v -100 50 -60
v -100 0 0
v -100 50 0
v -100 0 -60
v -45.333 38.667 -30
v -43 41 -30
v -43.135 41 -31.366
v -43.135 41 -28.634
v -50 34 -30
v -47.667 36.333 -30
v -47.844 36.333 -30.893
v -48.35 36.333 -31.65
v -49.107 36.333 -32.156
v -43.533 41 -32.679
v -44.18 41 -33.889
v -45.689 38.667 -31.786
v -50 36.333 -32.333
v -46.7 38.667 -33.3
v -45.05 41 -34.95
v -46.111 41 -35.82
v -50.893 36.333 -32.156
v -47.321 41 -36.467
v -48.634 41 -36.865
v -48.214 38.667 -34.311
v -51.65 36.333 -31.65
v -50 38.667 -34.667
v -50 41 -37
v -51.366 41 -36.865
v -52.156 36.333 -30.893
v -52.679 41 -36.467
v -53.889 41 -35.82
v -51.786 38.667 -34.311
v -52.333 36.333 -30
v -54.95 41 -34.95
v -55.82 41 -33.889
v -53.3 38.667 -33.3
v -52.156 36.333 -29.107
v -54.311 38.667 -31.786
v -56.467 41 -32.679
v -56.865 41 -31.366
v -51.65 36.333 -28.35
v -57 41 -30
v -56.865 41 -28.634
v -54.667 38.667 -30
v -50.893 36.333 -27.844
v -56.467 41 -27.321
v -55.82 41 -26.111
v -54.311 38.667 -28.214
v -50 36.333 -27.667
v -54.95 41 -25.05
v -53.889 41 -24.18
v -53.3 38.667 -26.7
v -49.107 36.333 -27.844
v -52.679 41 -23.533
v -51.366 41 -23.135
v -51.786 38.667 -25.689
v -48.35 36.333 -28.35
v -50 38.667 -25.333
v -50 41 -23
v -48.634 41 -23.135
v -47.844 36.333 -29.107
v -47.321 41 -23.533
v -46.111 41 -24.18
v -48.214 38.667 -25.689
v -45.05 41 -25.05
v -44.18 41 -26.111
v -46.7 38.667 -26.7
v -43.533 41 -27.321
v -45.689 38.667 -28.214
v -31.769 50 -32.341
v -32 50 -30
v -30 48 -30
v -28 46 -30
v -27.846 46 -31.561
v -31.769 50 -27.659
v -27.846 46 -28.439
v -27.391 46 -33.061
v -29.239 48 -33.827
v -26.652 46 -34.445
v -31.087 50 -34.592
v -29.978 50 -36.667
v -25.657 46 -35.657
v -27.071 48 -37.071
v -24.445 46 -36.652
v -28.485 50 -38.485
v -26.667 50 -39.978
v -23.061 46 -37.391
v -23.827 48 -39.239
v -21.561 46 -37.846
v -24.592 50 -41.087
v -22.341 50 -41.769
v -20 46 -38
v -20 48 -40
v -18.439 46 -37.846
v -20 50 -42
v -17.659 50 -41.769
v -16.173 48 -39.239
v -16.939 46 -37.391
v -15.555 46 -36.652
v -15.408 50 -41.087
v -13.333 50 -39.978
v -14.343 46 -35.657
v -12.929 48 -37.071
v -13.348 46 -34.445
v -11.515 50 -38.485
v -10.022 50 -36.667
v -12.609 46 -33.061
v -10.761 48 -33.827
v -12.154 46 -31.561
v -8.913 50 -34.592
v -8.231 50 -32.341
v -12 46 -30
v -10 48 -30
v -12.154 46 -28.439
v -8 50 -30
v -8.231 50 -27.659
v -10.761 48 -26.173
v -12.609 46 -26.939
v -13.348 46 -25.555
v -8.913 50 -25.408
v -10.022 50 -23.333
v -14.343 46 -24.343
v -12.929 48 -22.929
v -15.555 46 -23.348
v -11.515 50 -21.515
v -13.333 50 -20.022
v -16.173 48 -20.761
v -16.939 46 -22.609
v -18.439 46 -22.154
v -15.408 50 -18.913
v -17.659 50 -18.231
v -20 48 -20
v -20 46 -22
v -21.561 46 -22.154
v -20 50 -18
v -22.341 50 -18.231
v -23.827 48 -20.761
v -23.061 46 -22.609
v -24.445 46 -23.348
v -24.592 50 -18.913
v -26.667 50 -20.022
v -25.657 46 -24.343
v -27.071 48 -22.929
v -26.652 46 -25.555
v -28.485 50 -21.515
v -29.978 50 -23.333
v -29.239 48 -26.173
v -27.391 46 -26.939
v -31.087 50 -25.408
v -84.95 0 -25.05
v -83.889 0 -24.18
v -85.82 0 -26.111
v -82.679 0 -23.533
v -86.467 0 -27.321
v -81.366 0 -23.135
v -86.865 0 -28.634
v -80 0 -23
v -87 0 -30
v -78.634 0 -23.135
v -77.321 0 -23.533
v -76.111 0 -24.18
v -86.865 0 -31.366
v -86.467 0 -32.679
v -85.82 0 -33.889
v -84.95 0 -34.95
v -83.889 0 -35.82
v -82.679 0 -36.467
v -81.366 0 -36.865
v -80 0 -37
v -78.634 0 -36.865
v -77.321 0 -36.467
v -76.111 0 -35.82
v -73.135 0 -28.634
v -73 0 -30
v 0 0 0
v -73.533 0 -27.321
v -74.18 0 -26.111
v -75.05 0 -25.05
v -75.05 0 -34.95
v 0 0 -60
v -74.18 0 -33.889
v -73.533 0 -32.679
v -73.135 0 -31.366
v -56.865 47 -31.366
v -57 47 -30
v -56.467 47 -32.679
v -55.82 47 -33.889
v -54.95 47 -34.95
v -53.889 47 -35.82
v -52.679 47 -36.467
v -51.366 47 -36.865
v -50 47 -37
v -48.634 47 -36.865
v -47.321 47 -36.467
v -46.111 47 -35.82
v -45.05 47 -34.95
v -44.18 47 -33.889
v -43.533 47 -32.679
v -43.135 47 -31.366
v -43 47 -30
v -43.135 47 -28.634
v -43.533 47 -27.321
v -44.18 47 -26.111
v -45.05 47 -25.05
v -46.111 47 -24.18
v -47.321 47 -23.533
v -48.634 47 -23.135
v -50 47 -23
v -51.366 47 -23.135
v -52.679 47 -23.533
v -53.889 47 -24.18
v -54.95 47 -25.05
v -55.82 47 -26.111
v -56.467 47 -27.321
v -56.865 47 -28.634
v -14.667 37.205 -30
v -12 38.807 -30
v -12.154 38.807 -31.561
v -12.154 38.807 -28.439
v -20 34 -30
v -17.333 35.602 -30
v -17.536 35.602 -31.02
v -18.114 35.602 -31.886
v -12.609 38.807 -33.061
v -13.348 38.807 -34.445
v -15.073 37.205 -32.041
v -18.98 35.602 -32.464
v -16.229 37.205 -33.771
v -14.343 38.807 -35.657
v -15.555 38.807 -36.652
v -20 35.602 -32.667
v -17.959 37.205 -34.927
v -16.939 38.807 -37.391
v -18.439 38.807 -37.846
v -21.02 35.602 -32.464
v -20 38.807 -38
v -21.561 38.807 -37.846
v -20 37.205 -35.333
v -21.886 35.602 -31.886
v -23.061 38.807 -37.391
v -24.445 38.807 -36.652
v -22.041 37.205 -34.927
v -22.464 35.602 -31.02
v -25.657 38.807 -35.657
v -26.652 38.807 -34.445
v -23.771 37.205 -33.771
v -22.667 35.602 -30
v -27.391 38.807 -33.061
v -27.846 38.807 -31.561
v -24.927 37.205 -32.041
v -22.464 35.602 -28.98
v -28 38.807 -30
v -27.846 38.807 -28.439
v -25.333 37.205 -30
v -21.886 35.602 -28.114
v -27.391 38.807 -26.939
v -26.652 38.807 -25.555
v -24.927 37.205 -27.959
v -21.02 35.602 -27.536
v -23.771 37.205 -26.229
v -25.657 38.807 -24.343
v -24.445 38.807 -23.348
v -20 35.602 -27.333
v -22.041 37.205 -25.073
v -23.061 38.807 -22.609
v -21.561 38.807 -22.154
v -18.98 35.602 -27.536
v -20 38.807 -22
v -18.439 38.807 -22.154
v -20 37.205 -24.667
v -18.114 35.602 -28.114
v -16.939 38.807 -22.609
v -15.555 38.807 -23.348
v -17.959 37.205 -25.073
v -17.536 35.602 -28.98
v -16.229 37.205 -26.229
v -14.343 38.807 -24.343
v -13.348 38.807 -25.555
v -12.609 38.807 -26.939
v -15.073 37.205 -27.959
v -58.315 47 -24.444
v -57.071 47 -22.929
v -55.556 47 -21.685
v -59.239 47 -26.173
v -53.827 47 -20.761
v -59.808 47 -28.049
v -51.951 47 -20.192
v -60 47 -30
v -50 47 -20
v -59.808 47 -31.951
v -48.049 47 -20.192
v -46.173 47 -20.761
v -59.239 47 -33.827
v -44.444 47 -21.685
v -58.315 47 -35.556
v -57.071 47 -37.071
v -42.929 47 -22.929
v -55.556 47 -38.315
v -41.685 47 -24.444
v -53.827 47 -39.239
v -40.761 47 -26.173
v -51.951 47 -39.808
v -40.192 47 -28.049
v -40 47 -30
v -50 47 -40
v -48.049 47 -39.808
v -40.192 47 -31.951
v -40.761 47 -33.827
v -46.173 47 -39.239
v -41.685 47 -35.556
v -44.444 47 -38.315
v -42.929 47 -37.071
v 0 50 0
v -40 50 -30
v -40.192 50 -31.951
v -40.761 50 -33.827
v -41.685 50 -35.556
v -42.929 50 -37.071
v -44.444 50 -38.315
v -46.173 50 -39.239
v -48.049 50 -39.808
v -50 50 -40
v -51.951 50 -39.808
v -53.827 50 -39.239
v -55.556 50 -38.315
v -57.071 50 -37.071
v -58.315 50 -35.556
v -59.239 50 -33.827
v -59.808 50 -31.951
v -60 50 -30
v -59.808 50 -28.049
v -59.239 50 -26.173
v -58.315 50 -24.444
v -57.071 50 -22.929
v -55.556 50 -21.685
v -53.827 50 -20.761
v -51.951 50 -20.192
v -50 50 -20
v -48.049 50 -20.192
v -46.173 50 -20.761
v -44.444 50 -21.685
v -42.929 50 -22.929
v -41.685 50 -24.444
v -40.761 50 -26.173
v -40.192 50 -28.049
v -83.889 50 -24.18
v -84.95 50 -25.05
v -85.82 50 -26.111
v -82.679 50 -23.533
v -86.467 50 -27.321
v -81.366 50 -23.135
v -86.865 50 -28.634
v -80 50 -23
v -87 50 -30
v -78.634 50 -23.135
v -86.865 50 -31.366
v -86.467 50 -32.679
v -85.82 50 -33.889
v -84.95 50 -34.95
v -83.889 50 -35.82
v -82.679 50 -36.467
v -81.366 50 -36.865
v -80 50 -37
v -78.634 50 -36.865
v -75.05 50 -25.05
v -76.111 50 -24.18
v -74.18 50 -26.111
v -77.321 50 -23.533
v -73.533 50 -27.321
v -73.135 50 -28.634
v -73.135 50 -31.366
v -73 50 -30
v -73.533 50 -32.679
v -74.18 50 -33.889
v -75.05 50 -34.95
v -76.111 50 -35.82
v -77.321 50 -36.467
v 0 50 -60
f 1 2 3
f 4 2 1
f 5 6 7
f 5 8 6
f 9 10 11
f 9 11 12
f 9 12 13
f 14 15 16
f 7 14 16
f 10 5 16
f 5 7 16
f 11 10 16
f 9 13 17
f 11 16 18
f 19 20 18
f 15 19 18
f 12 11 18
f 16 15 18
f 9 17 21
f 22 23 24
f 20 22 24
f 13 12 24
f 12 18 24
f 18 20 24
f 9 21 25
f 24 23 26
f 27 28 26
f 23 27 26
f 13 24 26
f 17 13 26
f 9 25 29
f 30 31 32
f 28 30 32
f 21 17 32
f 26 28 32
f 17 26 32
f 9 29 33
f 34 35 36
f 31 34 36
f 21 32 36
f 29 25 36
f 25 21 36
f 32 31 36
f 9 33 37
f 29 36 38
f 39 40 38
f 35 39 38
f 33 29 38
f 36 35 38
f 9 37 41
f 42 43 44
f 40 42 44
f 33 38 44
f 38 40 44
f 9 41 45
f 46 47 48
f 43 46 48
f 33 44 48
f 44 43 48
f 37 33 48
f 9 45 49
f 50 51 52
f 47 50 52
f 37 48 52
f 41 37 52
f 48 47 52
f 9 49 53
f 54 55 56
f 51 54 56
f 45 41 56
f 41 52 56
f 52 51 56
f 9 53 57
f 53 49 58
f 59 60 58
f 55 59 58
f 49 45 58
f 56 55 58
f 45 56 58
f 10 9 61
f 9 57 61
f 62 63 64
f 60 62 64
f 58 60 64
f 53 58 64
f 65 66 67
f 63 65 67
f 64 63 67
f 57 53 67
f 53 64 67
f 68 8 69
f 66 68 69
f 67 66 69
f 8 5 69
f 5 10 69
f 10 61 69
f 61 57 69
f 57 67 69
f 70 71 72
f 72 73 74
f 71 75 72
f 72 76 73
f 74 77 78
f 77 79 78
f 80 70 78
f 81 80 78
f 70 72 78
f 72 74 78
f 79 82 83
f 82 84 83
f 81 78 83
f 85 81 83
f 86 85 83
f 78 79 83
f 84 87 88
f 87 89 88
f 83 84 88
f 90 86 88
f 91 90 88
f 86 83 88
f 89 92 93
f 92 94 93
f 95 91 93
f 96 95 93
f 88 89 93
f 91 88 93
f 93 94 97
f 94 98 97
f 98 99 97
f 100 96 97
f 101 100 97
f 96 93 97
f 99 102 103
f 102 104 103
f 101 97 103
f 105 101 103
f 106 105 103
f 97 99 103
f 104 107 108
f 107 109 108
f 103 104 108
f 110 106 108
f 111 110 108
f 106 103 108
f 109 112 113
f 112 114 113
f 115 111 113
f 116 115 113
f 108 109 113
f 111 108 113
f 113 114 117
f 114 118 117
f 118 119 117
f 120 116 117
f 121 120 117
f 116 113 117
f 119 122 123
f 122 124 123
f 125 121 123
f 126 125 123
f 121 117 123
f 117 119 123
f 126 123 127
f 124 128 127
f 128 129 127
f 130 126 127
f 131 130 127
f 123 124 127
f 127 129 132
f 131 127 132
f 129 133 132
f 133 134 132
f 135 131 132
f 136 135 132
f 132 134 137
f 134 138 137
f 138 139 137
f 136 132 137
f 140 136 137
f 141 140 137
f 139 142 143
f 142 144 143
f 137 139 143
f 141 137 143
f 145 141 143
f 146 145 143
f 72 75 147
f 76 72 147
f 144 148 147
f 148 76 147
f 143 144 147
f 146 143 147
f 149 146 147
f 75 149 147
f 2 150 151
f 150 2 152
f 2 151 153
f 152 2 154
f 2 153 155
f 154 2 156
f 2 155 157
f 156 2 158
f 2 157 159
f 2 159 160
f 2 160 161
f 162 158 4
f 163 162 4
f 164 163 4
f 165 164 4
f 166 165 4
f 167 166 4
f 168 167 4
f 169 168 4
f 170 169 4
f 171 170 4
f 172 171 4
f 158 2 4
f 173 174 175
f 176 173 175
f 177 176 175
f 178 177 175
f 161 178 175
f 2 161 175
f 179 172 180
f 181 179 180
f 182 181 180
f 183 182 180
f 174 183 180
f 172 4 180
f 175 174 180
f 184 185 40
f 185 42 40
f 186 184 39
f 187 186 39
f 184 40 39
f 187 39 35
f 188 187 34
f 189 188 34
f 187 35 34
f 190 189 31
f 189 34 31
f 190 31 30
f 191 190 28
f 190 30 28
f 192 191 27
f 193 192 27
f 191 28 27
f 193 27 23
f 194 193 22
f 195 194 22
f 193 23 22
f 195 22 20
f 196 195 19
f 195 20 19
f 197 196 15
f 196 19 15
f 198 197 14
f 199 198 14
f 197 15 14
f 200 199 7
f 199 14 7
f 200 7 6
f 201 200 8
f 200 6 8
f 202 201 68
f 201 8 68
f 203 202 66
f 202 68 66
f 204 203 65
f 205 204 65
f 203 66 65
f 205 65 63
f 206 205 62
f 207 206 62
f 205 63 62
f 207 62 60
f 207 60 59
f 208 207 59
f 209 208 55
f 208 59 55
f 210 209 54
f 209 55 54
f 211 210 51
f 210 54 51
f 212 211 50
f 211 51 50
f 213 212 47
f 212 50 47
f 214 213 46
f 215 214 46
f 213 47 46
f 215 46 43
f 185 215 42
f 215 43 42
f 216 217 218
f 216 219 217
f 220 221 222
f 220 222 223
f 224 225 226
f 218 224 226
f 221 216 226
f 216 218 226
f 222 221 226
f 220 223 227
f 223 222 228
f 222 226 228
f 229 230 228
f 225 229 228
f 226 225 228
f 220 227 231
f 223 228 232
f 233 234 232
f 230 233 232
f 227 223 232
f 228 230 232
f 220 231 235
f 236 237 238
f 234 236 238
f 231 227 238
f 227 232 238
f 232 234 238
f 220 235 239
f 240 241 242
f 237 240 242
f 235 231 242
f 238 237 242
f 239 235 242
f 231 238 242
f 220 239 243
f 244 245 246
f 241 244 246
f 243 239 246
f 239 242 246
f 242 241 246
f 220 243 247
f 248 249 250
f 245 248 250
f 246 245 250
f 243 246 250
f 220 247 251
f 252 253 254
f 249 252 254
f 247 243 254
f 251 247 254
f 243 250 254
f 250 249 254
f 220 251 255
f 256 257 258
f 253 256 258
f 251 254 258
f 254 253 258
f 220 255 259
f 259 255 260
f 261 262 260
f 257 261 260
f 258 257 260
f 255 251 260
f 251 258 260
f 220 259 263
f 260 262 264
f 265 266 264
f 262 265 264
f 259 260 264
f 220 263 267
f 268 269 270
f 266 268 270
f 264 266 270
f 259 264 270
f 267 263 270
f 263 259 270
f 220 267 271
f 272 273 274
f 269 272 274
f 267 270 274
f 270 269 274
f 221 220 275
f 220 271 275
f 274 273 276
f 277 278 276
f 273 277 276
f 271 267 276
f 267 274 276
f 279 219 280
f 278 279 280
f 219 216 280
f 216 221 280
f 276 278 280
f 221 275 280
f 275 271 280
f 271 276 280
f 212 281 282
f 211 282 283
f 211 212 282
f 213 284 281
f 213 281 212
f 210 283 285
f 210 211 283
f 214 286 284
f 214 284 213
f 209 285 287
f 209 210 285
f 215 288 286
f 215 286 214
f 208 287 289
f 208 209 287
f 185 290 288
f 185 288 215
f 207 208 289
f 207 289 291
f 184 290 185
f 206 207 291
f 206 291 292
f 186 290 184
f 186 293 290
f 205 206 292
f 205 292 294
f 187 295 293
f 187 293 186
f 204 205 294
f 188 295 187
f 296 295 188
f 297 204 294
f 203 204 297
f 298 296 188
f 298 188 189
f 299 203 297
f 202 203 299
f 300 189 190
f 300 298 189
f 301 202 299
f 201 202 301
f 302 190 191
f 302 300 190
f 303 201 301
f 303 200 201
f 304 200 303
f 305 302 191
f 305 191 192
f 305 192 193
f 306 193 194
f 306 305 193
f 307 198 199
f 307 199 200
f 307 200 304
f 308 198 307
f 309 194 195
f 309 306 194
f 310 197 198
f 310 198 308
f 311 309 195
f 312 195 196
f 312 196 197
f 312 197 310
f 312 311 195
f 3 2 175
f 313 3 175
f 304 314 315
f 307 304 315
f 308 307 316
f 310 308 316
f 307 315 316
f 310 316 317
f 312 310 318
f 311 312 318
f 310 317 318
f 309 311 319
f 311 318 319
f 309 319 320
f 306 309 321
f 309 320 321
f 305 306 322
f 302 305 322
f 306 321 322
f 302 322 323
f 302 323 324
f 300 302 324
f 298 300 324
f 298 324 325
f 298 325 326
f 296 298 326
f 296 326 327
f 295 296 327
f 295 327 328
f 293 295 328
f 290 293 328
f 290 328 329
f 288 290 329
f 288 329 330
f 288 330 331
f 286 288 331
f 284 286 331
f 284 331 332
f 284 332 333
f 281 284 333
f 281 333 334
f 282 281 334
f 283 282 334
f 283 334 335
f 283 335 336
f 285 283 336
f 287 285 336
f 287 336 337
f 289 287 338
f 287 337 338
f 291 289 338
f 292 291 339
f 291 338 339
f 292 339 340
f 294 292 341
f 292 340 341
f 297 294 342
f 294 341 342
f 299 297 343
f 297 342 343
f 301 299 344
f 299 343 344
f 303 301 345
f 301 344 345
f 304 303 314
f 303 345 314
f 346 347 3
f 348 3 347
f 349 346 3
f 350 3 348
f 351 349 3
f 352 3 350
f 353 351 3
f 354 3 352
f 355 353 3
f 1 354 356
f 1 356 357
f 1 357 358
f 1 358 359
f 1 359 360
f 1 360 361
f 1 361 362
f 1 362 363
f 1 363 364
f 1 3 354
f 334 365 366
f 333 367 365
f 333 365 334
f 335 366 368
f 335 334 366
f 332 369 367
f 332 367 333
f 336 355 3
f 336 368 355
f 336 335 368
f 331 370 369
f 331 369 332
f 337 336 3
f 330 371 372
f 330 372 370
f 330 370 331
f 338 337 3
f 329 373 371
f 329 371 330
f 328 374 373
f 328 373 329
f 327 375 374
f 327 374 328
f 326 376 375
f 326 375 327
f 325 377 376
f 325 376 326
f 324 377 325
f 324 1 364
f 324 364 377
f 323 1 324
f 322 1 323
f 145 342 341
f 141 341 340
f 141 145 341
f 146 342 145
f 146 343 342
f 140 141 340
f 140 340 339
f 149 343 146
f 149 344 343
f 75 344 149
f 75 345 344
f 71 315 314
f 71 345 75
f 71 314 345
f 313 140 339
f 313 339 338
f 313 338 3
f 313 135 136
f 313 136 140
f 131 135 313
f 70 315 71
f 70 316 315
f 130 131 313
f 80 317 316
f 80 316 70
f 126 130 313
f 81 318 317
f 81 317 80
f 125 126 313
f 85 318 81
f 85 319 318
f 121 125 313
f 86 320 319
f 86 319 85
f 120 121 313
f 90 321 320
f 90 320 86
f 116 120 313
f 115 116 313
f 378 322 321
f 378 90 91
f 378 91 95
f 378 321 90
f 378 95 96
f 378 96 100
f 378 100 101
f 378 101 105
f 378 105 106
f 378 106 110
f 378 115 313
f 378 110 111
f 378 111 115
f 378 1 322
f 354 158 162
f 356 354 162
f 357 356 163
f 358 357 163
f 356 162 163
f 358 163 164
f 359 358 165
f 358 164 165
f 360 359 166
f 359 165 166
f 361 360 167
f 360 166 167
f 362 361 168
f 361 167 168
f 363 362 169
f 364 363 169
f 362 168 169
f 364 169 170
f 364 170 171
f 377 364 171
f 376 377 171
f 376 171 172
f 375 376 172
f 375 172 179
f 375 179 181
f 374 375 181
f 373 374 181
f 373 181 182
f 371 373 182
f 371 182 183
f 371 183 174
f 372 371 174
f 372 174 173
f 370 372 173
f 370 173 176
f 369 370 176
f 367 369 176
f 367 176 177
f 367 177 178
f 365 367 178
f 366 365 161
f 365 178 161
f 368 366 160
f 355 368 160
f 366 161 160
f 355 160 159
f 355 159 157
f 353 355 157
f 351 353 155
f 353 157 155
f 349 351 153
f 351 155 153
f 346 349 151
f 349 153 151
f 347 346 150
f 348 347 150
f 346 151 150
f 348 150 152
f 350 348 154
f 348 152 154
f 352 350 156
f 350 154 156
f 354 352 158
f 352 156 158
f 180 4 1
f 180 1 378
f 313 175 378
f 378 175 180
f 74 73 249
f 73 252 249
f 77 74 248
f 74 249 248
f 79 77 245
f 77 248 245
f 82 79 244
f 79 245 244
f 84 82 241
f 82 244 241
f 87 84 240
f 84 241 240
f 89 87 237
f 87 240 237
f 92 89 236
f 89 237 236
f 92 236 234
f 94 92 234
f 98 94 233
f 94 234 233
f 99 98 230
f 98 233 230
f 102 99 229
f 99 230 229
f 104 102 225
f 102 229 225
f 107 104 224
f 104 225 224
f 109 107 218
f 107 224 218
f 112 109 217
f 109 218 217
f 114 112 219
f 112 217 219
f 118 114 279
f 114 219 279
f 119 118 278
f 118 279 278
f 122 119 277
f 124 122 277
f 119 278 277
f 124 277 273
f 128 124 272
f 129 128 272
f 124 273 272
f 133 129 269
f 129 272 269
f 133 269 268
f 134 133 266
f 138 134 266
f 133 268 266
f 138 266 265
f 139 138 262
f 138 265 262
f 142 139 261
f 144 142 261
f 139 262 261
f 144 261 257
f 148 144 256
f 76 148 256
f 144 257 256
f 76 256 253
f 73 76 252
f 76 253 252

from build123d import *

# Parameters (mm, degrees)
ESBO_O2_W                                 = 100
ESBO_O2_H                                 = 60
RESSALTO_EXTRUS_O1_DEPTH                  = 50
FURO1_D                                   = 14
FURO1_DEPTH                               = 9
FURO1_CBORE_D                             = 20
FURO1_CBORE_DEPTH                         = 3
FURO1_TIP                                 = 7
FURO2_D                                   = 16
FURO2_DEPTH                               = 11.193115048
FURO2_CSINK_D                             = 24
FURO2_CSINK_ANGLE                         = 90
FURO2_TIP                                 = 4.806884952
BROCA_DE_ROSQUEAR_PARA_TARRAXA_DE_M16X2_D = 14


with BuildPart() as part:
    # Esboço2 → Ressalto-extrusão1 (new body)
    with BuildSketch(Plane(origin=(0, 0, 0), x_dir=(1, 0, 0), z_dir=(0, 1, 0))):
        with Locations((-50, 30)):
            Rectangle(ESBO_O2_W, ESBO_O2_H)
    extrude(amount=RESSALTO_EXTRUS_O1_DEPTH)

    # Furo1
    with Locations(Plane(origin=(0, 50, 0), x_dir=(1, 0, 0), z_dir=(0, 1, 0))):
        with Locations((-50, 30)):
            CounterBoreHole(FURO1_D / 2, FURO1_CBORE_D / 2, FURO1_CBORE_DEPTH, depth=FURO1_DEPTH)
            with Locations((0, 0, -(FURO1_DEPTH + FURO1_TIP / 2))):  # 90° drill point
                Cone(0, FURO1_D / 2, FURO1_TIP, mode=Mode.SUBTRACT)

    # Furo2
    with Locations(Plane(origin=(0, 50, 0), x_dir=(1, 0, 0), z_dir=(0, 1, 0))):
        with Locations((-20, 30)):
            CounterSinkHole(FURO2_D / 2, FURO2_CSINK_D / 2, depth=FURO2_DEPTH, counter_sink_angle=FURO2_CSINK_ANGLE)
            with Locations((0, 0, -(FURO2_DEPTH + FURO2_TIP / 2))):  # 118° drill point
                Cone(0, FURO2_D / 2, FURO2_TIP, mode=Mode.SUBTRACT)

    # Broca de rosquear para tarraxa de M16x2.02 (through all)
    with Locations(Plane(origin=(0, 50, 0), x_dir=(1, 0, 0), z_dir=(0, 1, 0))):
        with Locations((-80, 30)):
            Hole(BROCA_DE_ROSQUEAR_PARA_TARRAXA_DE_M16X2_D / 2)


solid = part.part
